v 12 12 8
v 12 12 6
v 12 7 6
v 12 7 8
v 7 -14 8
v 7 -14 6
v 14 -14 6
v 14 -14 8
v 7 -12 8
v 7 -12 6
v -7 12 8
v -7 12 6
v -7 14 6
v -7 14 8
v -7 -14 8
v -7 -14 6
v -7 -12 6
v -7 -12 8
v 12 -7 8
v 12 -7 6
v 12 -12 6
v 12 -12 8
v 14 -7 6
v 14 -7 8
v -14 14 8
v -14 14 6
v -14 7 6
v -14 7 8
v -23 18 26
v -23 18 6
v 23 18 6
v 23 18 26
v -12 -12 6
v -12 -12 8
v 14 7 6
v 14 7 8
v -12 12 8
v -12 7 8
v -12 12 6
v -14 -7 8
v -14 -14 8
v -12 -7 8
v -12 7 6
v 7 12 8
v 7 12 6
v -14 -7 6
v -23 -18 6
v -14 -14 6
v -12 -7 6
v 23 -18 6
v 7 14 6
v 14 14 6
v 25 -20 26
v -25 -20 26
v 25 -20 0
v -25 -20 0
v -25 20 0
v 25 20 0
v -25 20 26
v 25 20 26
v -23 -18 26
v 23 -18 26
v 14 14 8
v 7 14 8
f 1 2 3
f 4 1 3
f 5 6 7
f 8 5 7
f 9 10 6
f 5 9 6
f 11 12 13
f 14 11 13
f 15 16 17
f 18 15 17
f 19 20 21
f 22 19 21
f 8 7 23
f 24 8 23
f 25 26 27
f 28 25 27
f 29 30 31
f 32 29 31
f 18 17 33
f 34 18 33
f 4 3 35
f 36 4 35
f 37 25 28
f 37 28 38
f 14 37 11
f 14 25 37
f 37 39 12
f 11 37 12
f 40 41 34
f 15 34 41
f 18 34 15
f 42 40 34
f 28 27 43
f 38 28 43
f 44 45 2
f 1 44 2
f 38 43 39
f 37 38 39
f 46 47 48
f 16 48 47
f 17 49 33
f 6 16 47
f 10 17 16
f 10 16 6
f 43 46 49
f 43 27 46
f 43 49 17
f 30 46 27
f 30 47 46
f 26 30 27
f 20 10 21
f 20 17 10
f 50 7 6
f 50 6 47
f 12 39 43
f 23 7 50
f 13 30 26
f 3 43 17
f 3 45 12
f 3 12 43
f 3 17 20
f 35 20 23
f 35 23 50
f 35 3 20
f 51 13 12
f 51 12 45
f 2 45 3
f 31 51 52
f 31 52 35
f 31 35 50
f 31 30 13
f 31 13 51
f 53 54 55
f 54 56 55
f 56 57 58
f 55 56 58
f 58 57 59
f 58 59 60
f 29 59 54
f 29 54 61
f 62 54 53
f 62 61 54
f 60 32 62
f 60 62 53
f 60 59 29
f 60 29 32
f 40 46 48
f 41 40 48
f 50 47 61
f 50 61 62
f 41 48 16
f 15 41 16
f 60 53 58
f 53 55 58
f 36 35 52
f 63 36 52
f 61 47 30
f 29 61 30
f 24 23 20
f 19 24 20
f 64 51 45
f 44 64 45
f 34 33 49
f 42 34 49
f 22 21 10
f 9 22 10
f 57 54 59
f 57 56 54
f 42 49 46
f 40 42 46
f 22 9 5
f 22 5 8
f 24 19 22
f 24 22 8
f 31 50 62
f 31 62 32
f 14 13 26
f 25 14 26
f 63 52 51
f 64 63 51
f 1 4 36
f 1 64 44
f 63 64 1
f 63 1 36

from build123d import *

# Parameters (mm, degrees)
F0_W     = 50
F0_H     = 40
F1_DEPTH = 6
F2_W     = 50
F2_H     = 40
F2_W_2   = 46
F2_H_2   = 36
F3_DEPTH = 20
F5_DEPTH = 2


with BuildPart() as f1:
    # F0 (on Top) → F1 (new body)
    with BuildSketch(Plane.XY):
        Rectangle(F0_W, F0_H)
    extrude(amount=F1_DEPTH)

    # F2 (on face) → F3 (join)
    with BuildSketch(Plane.XY.offset(6)):
        Rectangle(F2_W, F2_H)
        Rectangle(F2_W_2, F2_H_2, mode=Mode.SUBTRACT)
    extrude(amount=F3_DEPTH)

    # F4 (on face) → F5 (join)
    with BuildSketch(Plane.XY.offset(6)):
        Polygon((-12, 7), (-12, 12), (-7, 12), (-7, 14), (-14, 14), (-14, 7), align=None)
        Polygon((7, 12), (12, 12), (12, 7), (14, 7), (14, 14), (7, 14), align=None)
        Polygon((14, -7), (12, -7), (12, -12), (7, -12), (7, -14), (14, -14), align=None)
        Polygon((-7, -12), (-12, -12), (-12, -7), (-14, -7), (-14, -14), (-7, -14), align=None)
    extrude(amount=F5_DEPTH)


solid = f1.part
